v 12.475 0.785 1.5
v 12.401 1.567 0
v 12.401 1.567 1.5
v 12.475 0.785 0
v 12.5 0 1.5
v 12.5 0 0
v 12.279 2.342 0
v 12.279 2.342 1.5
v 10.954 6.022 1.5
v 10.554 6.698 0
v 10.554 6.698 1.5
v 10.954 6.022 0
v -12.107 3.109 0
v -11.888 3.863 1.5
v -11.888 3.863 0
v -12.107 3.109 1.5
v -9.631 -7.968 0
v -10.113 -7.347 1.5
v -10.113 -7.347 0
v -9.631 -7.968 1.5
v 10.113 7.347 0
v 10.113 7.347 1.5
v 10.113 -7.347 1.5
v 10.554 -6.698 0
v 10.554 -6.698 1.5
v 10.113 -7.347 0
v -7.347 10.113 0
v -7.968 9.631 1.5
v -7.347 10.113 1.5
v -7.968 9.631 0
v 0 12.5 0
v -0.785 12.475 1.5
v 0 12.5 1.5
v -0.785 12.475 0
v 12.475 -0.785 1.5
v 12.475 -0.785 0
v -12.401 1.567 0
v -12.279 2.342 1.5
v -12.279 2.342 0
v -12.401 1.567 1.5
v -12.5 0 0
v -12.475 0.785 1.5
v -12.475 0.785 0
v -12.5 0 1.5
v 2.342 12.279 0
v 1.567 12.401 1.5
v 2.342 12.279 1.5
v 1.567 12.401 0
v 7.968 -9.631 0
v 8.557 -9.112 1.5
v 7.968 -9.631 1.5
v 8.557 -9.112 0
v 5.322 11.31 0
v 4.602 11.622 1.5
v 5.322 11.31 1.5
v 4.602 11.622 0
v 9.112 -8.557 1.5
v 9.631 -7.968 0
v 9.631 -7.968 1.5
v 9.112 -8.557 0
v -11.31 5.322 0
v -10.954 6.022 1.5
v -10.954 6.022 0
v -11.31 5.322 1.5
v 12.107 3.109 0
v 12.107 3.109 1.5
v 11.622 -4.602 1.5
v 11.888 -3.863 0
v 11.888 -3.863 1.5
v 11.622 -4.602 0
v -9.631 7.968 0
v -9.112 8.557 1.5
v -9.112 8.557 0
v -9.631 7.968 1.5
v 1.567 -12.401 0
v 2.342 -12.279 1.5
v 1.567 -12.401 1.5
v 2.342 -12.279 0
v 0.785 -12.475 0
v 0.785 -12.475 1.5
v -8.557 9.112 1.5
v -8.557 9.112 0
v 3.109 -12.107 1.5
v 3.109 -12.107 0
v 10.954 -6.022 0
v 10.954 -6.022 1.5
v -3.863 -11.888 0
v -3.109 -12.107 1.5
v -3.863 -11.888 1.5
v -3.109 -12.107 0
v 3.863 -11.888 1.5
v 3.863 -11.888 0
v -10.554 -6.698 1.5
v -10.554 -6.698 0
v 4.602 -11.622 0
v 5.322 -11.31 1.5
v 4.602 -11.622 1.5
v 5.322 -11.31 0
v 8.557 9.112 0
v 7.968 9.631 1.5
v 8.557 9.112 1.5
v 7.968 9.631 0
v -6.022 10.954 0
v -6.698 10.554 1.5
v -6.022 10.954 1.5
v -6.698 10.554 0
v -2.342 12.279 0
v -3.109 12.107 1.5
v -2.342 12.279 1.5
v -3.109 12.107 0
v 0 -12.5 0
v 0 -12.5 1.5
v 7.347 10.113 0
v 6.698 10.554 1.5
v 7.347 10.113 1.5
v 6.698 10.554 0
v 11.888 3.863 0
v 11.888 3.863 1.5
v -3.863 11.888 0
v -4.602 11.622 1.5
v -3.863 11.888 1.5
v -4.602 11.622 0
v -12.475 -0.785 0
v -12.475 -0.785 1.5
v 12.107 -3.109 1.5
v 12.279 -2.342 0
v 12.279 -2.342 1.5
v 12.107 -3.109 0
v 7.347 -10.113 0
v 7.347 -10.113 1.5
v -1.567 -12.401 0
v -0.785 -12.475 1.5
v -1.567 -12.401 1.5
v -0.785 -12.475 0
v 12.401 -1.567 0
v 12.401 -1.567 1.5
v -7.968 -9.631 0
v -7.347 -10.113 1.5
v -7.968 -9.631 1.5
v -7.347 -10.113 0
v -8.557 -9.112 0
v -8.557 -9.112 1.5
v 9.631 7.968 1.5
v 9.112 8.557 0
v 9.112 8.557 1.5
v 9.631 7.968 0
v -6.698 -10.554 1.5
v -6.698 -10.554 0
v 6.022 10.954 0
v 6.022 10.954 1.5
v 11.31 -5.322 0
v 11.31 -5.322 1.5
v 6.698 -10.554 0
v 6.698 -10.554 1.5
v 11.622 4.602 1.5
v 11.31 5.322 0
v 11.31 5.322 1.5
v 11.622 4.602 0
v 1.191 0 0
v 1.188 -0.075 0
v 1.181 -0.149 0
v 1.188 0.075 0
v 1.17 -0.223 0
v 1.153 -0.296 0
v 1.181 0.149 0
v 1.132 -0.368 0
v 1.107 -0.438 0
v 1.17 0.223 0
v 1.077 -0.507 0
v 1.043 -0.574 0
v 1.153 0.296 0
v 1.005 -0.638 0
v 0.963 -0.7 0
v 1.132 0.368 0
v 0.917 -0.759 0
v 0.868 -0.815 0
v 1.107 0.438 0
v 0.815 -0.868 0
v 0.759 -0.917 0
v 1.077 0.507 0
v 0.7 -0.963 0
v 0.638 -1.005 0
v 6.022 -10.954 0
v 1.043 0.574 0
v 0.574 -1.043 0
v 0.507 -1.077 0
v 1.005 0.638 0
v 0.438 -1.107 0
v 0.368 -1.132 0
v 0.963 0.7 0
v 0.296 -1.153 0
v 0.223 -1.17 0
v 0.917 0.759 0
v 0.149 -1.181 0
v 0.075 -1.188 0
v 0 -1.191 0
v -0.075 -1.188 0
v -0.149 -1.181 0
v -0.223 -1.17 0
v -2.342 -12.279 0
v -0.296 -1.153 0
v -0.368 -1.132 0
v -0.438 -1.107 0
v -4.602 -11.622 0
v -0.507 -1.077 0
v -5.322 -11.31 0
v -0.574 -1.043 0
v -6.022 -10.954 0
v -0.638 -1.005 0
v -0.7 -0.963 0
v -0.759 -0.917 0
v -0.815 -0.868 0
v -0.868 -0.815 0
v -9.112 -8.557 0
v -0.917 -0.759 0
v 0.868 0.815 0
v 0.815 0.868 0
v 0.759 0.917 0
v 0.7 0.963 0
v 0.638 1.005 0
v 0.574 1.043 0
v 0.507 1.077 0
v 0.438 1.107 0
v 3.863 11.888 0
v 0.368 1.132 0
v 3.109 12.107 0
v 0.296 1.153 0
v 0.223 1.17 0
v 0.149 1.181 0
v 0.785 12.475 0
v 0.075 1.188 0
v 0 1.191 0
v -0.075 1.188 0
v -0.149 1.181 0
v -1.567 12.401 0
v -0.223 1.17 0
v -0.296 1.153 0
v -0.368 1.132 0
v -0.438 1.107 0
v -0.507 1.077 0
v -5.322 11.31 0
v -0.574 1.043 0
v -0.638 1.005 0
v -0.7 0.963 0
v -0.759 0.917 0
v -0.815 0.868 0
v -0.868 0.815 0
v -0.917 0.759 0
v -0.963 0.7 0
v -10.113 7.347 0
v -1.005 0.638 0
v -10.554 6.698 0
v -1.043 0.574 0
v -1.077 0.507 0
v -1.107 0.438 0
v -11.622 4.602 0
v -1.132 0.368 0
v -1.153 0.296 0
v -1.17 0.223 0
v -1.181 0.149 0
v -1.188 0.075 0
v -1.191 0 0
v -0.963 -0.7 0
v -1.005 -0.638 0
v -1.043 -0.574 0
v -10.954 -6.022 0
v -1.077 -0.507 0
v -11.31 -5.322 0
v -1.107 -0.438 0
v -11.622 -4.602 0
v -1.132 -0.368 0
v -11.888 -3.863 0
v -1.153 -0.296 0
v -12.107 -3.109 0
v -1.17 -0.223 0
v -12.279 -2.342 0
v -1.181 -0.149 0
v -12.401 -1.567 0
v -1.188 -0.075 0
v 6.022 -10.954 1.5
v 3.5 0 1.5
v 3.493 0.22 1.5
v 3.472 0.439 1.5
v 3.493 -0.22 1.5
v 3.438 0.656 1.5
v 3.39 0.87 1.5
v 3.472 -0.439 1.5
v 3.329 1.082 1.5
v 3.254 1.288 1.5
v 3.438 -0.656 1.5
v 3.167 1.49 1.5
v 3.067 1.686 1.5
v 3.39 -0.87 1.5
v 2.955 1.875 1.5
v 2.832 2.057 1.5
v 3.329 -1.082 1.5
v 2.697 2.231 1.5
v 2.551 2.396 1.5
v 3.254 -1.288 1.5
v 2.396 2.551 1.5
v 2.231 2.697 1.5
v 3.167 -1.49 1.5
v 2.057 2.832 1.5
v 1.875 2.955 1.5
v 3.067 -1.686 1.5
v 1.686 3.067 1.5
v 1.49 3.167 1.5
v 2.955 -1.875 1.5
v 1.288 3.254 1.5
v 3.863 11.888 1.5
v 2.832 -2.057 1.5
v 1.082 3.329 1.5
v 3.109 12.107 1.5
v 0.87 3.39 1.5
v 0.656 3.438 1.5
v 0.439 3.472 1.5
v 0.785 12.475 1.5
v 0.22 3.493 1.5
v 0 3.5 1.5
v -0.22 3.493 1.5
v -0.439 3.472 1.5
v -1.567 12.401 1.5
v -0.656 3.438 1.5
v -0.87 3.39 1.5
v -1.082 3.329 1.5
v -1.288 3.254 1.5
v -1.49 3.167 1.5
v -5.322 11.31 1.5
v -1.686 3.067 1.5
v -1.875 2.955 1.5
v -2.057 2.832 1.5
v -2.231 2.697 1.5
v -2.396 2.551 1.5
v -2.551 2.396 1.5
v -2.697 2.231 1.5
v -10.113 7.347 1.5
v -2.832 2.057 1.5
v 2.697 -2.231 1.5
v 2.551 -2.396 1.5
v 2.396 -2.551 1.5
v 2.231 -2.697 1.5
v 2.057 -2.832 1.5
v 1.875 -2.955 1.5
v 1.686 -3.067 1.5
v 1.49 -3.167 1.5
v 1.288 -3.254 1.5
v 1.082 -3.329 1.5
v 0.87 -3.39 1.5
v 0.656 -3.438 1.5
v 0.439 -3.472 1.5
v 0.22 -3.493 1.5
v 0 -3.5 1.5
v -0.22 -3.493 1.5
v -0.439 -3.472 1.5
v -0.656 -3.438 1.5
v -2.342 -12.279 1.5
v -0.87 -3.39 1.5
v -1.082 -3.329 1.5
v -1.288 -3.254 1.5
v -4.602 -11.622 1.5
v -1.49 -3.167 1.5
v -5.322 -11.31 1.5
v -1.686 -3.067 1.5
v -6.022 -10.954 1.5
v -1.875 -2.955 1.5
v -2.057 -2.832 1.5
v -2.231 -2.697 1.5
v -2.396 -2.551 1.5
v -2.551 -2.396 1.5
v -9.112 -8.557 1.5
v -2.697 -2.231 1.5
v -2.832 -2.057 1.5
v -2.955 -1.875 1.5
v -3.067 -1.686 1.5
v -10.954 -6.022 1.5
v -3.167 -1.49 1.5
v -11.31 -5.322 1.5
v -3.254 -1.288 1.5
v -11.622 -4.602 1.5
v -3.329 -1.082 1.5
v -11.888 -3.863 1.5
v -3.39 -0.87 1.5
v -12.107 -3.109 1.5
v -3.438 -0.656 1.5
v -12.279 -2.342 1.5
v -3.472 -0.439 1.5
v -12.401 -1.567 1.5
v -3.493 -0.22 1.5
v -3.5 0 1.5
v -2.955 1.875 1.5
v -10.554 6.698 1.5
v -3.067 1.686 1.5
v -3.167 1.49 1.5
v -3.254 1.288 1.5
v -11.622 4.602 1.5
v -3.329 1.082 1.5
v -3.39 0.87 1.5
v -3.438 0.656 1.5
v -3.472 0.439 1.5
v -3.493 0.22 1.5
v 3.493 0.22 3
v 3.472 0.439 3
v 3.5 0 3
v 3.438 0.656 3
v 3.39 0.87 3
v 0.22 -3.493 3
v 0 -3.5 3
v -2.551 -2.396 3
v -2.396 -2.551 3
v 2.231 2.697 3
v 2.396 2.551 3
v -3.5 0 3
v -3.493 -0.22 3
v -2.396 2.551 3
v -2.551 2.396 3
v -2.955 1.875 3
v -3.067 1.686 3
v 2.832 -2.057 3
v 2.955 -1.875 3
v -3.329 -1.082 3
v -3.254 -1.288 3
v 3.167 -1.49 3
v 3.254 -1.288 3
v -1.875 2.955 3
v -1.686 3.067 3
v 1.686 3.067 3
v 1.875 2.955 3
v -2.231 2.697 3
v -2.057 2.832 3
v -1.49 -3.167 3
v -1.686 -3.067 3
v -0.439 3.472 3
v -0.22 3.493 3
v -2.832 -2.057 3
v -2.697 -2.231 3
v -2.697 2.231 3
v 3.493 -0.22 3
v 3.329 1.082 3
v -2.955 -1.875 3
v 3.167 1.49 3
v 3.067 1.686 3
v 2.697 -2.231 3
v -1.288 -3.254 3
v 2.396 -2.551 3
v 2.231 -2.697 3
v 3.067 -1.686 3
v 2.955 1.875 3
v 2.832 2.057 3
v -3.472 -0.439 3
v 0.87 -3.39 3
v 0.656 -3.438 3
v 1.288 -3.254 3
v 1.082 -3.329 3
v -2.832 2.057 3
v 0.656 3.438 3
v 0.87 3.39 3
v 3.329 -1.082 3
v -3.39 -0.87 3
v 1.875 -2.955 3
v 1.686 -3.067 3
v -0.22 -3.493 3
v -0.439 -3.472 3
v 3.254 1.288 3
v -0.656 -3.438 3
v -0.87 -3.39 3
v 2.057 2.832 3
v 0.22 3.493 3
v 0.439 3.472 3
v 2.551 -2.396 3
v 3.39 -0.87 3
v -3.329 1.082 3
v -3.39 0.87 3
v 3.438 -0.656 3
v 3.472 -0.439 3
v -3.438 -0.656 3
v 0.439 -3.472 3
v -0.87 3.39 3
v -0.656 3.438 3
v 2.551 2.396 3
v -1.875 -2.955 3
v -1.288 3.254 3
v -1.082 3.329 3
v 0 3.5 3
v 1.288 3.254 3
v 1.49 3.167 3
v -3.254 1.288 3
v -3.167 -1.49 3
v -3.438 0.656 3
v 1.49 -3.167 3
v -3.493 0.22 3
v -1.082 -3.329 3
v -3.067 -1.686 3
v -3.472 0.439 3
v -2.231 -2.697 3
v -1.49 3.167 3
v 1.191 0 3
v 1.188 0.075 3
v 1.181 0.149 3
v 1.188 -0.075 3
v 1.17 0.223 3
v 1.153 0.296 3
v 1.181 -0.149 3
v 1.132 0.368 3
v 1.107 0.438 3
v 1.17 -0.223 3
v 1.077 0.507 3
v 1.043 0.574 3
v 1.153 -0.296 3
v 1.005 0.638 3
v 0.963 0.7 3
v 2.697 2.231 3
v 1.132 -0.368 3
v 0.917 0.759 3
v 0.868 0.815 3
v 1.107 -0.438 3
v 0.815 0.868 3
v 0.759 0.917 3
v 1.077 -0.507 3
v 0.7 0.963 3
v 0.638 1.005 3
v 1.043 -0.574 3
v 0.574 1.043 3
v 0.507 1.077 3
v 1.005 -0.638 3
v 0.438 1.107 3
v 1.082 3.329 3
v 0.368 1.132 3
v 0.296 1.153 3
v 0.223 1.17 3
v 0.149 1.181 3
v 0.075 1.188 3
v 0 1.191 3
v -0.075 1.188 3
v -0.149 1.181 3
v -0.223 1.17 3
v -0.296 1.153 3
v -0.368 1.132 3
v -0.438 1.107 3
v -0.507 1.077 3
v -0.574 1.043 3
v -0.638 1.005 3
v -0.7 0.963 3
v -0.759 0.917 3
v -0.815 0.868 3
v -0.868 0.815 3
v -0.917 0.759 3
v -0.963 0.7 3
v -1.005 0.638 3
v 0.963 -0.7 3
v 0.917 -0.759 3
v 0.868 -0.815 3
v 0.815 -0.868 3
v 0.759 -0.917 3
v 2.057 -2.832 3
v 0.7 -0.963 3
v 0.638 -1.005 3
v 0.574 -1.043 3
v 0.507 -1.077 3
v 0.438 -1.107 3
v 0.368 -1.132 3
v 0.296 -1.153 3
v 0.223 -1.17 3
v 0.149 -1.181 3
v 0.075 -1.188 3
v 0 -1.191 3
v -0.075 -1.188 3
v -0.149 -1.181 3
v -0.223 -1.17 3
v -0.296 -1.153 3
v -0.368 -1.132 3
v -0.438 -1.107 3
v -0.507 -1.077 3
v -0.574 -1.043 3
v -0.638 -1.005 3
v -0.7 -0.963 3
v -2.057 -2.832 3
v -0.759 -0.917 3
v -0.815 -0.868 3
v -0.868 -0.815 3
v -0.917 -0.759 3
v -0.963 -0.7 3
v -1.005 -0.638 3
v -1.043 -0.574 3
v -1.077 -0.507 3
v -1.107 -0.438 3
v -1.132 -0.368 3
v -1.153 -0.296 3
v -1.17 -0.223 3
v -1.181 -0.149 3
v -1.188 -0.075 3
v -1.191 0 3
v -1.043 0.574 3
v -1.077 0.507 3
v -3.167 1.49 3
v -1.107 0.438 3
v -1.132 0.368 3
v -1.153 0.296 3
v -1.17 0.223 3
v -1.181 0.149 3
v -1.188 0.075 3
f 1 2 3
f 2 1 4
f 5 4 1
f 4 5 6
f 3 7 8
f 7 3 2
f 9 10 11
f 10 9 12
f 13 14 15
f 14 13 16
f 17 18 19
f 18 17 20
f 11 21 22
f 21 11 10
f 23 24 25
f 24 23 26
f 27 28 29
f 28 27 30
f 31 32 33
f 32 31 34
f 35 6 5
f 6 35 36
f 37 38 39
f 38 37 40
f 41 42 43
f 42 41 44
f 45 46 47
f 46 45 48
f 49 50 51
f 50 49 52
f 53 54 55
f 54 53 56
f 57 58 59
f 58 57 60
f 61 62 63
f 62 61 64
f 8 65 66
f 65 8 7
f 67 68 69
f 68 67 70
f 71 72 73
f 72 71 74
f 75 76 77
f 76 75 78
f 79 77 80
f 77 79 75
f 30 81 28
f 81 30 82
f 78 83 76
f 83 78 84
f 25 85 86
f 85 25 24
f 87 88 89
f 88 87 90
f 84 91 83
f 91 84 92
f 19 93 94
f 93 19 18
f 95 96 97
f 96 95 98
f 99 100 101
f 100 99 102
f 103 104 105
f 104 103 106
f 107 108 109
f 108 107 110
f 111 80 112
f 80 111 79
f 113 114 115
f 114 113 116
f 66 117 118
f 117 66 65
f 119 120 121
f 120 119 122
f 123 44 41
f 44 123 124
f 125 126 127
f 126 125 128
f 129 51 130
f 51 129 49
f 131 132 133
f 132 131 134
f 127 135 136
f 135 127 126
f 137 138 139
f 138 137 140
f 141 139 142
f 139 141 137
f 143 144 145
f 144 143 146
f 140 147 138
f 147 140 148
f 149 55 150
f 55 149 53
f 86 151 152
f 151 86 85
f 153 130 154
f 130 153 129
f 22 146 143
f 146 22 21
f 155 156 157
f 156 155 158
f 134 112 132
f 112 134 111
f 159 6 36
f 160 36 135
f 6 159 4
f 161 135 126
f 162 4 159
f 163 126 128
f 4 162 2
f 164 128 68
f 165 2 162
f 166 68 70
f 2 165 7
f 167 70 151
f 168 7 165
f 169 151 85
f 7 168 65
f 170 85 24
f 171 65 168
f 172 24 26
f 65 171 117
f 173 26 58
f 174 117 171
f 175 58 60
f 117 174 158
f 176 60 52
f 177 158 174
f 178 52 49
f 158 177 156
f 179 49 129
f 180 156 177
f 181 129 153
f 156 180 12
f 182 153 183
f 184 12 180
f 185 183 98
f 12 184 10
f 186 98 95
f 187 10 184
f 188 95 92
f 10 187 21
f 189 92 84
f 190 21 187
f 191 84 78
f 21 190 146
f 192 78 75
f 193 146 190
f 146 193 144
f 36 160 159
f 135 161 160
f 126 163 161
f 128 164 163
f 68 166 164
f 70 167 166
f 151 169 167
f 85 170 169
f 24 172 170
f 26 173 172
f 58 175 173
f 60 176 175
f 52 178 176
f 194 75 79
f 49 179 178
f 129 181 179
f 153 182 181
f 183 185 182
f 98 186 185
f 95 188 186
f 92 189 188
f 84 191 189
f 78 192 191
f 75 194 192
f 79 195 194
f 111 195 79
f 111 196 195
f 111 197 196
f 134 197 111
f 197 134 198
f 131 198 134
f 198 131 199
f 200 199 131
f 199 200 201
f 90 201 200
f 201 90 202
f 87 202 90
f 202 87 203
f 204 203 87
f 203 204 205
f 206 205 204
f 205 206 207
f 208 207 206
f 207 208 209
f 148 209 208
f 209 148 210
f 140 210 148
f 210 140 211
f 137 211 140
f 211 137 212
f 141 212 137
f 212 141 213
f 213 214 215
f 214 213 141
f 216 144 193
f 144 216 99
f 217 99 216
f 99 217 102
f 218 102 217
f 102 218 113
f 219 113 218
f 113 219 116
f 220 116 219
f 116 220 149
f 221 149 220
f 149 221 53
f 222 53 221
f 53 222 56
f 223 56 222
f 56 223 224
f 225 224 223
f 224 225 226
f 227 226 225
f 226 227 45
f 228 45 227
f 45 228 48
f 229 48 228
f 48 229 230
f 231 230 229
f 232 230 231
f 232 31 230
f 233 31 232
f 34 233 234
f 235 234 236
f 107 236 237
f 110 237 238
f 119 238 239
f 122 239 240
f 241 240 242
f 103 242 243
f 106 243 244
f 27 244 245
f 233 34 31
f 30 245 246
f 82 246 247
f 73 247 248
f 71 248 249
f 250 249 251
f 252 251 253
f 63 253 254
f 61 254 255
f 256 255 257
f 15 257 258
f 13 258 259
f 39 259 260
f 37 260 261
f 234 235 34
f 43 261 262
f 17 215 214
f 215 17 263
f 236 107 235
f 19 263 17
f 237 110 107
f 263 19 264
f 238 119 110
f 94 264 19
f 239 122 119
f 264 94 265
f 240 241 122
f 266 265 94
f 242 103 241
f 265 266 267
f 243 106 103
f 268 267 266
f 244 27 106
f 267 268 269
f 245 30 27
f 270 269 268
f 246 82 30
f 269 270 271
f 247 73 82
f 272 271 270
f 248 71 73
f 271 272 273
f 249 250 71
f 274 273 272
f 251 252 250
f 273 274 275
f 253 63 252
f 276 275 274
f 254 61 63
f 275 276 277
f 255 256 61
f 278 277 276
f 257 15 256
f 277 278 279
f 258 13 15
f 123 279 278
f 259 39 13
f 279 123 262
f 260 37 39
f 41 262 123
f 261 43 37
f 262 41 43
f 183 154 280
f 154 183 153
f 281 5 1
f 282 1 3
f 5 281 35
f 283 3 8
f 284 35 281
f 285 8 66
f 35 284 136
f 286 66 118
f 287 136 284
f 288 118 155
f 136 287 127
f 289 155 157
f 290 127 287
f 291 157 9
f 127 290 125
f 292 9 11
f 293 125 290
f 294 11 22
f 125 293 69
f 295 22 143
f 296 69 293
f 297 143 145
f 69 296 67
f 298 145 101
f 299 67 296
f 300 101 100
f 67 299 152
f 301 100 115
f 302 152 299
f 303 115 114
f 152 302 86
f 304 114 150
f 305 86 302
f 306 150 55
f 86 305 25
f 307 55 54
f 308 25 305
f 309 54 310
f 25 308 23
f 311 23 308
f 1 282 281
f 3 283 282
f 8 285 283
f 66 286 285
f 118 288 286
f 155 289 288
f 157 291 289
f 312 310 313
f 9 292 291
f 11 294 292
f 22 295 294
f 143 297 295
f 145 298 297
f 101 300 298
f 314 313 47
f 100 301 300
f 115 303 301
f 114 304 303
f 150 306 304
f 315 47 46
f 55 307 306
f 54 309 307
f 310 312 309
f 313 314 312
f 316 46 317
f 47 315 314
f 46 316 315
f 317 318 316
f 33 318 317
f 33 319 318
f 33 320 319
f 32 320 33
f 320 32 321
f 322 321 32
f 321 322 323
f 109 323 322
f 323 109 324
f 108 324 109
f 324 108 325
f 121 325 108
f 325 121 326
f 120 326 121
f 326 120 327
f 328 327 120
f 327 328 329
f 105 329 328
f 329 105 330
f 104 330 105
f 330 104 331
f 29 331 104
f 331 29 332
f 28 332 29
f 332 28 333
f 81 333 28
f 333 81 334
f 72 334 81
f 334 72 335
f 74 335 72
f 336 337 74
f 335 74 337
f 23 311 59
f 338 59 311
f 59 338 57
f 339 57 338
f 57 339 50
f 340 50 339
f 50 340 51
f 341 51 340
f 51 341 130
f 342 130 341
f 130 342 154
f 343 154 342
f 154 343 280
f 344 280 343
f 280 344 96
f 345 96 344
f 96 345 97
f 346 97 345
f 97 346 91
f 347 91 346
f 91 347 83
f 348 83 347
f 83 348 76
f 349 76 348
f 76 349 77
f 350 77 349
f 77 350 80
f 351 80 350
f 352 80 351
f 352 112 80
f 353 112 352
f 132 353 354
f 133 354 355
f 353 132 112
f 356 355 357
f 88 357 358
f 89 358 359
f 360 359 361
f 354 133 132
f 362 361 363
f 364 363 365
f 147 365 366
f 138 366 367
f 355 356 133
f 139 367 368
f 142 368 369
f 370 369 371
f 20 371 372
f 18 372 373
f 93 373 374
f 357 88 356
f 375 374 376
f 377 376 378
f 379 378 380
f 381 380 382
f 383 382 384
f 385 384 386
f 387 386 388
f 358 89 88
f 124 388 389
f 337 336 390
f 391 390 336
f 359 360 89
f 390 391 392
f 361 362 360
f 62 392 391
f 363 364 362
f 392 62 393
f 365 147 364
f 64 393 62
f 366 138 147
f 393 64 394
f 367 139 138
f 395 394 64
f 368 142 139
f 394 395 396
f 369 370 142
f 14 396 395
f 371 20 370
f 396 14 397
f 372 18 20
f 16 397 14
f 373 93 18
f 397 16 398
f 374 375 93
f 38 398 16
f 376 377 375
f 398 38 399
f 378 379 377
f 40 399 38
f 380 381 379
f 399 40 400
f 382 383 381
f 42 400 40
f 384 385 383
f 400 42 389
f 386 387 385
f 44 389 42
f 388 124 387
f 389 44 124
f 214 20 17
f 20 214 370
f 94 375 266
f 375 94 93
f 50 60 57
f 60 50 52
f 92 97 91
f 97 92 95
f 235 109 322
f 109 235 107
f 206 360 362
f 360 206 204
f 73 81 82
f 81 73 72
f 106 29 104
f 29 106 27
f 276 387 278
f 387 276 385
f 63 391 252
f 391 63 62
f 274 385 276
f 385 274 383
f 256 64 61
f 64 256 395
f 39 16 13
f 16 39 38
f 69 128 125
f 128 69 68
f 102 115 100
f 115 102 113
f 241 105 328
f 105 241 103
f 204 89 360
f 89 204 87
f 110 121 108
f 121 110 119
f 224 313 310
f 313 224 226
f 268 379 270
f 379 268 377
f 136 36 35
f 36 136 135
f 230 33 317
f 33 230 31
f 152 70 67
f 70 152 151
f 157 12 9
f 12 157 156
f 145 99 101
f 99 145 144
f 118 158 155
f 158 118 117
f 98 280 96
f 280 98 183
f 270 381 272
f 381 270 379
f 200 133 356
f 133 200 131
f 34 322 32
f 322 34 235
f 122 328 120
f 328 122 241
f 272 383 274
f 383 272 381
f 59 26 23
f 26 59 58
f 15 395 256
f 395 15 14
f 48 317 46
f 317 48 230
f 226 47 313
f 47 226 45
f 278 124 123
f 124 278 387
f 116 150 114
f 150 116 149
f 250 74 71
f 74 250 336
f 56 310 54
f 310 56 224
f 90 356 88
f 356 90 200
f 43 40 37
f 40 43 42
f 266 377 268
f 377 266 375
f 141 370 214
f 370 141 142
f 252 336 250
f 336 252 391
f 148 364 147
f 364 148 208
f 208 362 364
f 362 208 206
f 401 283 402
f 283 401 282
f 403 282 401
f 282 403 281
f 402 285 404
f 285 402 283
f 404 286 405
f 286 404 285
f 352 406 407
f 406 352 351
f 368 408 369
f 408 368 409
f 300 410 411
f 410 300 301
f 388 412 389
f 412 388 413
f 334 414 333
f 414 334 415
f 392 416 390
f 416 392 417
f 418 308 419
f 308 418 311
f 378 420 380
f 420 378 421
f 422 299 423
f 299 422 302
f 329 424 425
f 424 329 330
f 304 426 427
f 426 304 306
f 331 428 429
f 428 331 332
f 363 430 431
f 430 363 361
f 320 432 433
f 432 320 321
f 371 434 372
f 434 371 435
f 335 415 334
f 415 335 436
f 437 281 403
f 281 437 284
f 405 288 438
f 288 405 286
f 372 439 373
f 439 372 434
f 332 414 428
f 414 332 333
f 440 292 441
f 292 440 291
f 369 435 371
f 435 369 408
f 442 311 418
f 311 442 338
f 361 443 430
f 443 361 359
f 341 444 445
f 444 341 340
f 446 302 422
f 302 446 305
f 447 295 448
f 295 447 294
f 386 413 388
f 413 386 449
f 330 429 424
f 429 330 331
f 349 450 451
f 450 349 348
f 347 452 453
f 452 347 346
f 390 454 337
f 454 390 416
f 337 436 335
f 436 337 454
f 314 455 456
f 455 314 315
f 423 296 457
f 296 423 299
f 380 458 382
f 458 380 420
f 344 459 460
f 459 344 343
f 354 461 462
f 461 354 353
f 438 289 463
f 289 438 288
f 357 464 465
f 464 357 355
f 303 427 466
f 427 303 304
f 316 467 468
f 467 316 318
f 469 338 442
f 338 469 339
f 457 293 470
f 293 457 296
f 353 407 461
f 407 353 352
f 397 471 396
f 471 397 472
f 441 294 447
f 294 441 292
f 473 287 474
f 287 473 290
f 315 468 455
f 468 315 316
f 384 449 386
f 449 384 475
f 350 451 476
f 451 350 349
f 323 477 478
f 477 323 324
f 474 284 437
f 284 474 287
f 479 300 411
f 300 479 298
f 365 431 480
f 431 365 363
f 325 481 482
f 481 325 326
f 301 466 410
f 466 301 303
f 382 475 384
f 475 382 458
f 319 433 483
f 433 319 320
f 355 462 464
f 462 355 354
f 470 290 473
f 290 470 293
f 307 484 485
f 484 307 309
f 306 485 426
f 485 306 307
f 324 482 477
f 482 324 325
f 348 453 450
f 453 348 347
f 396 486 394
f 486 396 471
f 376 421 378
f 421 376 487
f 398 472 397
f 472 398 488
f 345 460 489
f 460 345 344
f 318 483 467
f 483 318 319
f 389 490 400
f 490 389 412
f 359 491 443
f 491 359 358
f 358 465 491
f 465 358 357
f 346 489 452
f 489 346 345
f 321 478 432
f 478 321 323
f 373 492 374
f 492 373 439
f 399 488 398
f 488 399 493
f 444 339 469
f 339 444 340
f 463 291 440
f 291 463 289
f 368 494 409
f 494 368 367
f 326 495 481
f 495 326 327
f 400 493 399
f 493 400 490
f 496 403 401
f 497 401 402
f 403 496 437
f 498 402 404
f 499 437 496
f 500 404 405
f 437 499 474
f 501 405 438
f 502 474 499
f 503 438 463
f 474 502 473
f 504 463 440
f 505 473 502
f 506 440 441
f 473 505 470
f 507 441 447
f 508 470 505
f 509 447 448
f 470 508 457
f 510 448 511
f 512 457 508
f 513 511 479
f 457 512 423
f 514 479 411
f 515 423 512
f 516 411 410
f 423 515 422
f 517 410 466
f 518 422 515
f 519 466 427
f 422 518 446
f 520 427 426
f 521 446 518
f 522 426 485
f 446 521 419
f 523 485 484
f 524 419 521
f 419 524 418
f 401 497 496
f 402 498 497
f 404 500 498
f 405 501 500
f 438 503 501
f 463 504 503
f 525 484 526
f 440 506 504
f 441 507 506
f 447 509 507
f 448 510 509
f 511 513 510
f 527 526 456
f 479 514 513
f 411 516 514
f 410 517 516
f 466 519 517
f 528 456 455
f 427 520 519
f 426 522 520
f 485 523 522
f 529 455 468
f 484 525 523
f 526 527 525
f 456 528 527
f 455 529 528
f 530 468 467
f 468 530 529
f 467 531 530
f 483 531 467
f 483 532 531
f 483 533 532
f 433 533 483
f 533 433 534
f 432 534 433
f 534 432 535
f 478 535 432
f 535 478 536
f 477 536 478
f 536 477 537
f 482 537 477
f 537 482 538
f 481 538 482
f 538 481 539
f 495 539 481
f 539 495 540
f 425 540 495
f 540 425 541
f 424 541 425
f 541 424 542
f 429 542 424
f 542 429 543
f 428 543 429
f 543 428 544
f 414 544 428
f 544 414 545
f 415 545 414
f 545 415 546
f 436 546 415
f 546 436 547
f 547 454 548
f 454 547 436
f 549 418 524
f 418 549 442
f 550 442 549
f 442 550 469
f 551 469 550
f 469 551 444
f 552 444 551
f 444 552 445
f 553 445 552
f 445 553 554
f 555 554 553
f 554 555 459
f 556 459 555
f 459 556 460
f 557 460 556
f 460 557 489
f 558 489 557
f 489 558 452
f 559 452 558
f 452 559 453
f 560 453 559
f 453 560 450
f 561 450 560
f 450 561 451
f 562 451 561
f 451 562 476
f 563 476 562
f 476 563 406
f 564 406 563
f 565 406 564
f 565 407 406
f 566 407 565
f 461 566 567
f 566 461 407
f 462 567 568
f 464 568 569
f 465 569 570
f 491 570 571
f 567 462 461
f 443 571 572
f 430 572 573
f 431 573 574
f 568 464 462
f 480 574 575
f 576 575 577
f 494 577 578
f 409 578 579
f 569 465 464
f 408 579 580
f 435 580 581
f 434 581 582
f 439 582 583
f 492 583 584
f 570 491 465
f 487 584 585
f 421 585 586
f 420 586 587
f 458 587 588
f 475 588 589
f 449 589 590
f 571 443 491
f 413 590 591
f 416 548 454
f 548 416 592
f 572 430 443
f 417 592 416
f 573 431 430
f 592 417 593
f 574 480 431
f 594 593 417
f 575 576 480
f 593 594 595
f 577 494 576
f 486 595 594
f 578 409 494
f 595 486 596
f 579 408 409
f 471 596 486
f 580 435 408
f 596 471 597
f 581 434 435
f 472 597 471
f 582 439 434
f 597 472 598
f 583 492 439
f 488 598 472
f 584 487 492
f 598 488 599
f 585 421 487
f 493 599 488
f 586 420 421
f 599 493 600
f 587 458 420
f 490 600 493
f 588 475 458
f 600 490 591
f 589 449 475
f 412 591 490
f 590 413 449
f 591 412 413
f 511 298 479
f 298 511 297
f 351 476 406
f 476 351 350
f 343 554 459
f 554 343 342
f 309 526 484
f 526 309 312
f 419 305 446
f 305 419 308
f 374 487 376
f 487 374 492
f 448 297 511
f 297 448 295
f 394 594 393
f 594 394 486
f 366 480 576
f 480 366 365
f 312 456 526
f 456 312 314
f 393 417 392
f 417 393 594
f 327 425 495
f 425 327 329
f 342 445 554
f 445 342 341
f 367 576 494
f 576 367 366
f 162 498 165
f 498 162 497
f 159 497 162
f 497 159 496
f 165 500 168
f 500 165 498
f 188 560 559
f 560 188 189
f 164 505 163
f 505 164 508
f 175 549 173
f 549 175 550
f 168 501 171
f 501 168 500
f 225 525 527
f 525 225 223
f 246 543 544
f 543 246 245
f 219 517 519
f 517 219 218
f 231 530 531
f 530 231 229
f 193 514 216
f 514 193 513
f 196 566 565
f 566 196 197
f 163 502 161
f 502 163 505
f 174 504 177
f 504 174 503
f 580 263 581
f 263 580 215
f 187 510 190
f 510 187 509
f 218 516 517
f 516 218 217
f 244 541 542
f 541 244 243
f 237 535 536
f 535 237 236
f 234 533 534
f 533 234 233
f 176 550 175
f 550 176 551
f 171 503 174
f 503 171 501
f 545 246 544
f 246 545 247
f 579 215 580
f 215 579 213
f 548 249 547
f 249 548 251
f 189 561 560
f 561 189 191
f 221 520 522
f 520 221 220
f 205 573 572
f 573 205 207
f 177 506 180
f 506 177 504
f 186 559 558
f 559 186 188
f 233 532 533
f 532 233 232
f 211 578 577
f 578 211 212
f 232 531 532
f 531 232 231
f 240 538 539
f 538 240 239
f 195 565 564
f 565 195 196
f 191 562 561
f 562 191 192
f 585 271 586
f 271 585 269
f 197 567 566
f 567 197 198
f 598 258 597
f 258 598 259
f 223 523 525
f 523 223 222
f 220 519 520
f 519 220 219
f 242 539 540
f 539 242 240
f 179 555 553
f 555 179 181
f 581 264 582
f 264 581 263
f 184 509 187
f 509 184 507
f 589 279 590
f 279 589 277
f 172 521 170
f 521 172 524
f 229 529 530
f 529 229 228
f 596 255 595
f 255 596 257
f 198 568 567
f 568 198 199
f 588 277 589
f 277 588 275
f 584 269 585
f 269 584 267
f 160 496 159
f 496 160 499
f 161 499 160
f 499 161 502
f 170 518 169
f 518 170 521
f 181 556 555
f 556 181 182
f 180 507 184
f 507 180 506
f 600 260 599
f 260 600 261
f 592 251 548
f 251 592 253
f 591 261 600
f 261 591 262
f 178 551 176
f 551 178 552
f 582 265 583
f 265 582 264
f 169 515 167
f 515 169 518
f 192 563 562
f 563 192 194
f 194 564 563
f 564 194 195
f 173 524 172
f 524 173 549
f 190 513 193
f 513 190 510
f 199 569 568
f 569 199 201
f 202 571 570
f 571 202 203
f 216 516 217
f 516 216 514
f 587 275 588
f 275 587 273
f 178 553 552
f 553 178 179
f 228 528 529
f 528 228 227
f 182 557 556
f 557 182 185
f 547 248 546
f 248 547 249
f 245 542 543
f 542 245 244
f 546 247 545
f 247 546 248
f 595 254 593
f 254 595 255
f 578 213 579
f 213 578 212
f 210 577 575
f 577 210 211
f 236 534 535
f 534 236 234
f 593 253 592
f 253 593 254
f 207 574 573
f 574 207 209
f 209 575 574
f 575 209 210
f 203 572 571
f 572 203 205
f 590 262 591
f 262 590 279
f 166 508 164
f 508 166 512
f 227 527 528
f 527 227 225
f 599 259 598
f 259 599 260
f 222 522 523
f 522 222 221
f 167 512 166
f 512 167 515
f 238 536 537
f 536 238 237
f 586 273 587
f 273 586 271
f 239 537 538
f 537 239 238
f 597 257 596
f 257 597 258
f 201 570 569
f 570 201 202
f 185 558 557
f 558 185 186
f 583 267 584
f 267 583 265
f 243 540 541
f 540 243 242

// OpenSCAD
diameter = 25;
height = 3;


module import_book_charkha_file(name) {
    import(str("Book_Charkha_centered", "/", name));
}
function inch_to_mm(inches) = inches * 25.4;

module base() {
    cylinder(h = height * 0.5, d = 25, $fn = 100);

    translate([0, 0, height * 0.5]) cylinder(h = height * 0.5, d = diameter - 2 * 9, $fn=100);
}

//#import_book_charkha_file("Spindle_Guard.stl");

difference() {
    base();
    cylinder(h= height, d = inch_to_mm(3 / 32), $fn=100);
}
